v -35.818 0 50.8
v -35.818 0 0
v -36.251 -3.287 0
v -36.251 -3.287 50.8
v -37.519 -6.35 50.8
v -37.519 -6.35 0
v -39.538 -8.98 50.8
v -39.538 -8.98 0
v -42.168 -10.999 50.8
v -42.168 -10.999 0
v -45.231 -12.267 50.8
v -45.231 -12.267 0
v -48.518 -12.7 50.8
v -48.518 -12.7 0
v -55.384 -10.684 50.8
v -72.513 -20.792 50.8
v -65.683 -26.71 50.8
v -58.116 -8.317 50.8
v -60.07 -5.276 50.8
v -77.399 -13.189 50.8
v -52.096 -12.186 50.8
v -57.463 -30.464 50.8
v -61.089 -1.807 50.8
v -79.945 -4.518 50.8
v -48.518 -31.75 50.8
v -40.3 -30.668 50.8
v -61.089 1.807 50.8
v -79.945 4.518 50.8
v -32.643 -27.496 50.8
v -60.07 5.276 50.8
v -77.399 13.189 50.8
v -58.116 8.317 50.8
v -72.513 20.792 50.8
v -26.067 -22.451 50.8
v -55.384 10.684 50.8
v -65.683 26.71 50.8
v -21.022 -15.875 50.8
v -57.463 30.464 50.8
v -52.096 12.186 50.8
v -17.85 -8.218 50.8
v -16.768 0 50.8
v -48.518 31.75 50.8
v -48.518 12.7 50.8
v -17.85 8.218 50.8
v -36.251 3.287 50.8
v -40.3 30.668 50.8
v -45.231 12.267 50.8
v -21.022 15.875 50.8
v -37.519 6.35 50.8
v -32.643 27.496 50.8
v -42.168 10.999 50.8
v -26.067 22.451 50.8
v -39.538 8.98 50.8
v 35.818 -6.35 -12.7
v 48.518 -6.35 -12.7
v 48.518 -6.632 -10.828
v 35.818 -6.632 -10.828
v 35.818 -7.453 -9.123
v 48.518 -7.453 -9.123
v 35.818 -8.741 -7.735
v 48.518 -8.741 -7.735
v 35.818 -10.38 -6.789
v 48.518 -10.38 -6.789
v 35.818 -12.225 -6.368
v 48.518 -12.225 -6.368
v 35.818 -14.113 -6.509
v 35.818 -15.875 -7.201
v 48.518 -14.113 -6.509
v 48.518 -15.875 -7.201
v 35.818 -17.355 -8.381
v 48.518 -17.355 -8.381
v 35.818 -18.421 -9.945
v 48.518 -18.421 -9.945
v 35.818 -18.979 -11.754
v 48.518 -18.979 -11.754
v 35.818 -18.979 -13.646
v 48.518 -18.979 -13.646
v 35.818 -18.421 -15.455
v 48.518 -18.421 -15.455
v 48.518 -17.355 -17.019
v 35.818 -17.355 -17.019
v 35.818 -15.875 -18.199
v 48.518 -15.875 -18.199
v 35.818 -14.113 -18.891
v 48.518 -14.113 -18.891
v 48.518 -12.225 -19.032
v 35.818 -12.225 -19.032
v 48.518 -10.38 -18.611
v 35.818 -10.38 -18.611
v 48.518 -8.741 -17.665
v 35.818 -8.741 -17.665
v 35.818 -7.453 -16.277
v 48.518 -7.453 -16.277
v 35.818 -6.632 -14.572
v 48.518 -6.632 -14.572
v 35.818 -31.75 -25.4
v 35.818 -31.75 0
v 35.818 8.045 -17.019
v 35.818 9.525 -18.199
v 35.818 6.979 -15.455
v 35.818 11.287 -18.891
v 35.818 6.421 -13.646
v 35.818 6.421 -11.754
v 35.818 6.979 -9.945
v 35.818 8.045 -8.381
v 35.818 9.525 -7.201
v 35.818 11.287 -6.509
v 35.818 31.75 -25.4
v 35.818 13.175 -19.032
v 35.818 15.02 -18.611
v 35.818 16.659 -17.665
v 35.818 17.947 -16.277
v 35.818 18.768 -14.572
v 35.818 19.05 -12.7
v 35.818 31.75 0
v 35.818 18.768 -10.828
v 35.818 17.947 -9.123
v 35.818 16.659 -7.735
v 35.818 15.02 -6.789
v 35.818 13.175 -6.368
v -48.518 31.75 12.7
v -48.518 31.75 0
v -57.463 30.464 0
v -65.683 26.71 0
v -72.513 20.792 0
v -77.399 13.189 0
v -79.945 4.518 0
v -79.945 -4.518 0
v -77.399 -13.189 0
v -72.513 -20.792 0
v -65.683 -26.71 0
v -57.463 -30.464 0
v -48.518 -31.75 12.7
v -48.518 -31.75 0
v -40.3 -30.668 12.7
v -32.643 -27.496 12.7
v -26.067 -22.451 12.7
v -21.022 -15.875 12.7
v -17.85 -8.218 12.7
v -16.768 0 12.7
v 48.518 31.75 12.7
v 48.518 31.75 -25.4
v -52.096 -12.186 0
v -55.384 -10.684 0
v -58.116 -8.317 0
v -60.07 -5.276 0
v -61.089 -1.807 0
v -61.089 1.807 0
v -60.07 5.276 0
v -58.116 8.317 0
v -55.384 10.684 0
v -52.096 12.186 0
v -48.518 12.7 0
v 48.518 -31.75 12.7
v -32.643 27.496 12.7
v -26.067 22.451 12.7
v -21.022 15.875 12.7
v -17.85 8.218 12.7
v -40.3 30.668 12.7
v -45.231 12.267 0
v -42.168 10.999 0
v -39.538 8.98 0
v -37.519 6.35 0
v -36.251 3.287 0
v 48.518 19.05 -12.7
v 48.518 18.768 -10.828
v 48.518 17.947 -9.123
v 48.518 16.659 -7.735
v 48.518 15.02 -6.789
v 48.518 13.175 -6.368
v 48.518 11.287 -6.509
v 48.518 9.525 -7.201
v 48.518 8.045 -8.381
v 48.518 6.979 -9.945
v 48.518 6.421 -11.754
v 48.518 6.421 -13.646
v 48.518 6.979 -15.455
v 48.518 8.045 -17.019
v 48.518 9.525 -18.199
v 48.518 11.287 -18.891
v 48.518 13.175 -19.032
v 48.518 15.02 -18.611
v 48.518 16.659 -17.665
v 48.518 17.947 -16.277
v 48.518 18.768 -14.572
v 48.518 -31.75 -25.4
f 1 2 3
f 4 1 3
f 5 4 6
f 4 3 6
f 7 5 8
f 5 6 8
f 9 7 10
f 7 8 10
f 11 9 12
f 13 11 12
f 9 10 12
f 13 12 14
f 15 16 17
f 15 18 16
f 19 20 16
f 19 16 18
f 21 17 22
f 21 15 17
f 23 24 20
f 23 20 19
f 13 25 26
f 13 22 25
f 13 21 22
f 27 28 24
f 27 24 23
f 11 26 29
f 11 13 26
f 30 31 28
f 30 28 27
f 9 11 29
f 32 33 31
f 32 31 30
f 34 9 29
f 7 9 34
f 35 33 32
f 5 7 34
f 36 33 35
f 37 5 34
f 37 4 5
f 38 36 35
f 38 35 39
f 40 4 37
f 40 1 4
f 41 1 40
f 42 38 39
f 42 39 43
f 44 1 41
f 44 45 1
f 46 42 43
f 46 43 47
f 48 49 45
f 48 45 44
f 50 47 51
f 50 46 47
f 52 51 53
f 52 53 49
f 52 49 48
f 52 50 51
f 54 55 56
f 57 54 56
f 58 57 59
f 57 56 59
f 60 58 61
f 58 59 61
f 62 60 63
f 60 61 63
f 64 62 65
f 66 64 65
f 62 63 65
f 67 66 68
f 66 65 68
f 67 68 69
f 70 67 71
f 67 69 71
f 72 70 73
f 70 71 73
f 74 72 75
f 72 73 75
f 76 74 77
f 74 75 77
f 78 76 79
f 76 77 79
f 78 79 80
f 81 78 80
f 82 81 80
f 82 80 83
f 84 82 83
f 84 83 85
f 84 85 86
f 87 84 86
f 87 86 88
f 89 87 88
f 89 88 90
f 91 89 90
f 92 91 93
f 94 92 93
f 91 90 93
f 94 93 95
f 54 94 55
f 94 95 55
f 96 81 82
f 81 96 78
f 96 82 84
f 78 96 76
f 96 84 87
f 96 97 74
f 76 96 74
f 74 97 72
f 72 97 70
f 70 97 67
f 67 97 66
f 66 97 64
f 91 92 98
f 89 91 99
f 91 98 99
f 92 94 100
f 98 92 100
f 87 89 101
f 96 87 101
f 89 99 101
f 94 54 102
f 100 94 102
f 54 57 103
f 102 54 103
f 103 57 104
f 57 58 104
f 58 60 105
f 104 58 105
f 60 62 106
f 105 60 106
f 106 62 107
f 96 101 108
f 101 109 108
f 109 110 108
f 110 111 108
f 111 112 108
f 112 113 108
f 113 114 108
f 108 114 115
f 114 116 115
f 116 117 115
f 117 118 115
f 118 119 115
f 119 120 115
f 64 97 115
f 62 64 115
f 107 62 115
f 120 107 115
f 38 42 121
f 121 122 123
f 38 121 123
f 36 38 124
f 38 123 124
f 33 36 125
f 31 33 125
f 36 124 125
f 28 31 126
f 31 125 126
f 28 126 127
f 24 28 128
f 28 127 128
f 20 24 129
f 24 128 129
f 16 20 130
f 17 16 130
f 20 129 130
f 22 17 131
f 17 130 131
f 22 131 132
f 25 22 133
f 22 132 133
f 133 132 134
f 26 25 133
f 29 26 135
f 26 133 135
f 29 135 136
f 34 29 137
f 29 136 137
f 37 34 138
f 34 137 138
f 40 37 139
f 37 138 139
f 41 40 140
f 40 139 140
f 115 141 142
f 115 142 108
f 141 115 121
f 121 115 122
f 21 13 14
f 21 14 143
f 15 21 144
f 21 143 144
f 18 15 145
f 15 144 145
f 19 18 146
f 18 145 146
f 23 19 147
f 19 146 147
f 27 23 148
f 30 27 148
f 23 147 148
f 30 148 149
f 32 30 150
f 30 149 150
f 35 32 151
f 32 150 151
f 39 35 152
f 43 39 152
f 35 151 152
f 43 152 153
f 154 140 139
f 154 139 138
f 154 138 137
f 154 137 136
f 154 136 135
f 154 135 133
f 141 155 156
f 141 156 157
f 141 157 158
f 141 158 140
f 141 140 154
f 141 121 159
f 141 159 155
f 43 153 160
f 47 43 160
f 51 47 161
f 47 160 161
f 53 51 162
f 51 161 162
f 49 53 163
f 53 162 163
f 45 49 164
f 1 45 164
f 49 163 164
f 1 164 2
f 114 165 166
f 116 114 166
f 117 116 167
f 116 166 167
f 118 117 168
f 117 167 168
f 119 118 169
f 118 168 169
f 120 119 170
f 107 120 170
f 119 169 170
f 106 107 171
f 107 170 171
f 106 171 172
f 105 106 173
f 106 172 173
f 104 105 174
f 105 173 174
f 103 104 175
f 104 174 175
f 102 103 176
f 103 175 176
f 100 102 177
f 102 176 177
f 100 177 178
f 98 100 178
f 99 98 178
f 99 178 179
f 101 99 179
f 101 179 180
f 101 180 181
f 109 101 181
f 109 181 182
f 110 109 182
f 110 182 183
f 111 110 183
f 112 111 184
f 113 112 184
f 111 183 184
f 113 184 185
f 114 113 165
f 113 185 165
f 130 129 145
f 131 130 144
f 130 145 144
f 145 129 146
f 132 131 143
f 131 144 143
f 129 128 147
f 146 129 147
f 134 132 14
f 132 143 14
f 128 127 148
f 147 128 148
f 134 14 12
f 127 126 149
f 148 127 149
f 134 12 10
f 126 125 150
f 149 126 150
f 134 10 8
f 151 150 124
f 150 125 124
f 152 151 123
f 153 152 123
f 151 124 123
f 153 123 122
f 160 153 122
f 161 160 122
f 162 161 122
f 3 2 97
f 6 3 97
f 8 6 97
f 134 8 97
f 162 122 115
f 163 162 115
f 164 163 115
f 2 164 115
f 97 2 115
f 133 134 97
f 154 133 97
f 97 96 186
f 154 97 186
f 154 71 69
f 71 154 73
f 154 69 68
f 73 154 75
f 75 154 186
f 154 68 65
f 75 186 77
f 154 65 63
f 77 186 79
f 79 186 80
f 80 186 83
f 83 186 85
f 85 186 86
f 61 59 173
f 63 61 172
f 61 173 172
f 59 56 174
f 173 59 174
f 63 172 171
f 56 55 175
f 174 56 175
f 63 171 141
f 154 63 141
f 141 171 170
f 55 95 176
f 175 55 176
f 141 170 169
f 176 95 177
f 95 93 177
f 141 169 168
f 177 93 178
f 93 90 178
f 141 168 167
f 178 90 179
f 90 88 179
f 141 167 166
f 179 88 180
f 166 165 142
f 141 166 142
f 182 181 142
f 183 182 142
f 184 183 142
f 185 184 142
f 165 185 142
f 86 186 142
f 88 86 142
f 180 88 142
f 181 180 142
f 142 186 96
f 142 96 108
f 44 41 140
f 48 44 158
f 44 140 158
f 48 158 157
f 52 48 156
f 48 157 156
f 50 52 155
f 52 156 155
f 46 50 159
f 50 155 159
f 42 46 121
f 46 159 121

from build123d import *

# Parameters (mm, degrees)
F1_DEPTH = 12.7
F2_DEPTH = 50.8
F3_R     = 6.35
F4_DEPTH = 12.7


with BuildPart() as f1:
    # F0 (on Top) → F1 (new body)
    with BuildSketch(Plane.XY):
        with BuildLine():
            Line((-48.517924, -31.75), (48.517924, -31.75))
            Line((48.517924, -31.75), (48.517924, 31.75))
            Line((48.517924, 31.75), (-48.517924, 31.75))
            ThreePointArc((-48.517924, 31.75), (-26.067284, 22.45064), (-16.767924, 0))
            ThreePointArc((-16.767924, 0), (-26.067284, -22.45064), (-48.517924, -31.75))
        make_face()
        with BuildLine():
            ThreePointArc((-48.517924, 31.75), (-80.267924, 0), (-48.517924, -31.75))
            Line((-48.517924, -31.75), (-48.517924, -12.7))
            ThreePointArc((-48.517924, -12.7), (-61.217924, 0), (-48.517924, 12.7))
            Line((-48.517924, 12.7), (-48.517924, 31.75))
        make_face()
    extrude(amount=F1_DEPTH)

    # F0 (on Top) → F2 (join)
    with BuildSketch(Plane.XY):
        with BuildLine():
            Line((-48.517924, -12.7), (-48.517924, -31.75))
            ThreePointArc((-48.517924, -31.75), (-26.067284, -22.45064), (-16.767924, 0))
            ThreePointArc((-16.767924, 0), (-26.067284, 22.45064), (-48.517924, 31.75))
            Line((-48.517924, 31.75), (-48.517924, 12.7))
            ThreePointArc((-48.517924, 12.7), (-39.537668, 8.980256), (-35.817924, 0))
            ThreePointArc((-35.817924, 0), (-39.537668, -8.980256), (-48.517924, -12.7))
        make_face()
        with BuildLine():
            ThreePointArc((-48.517924, 31.75), (-80.267924, 0), (-48.517924, -31.75))
            Line((-48.517924, -31.75), (-48.517924, -12.7))
            ThreePointArc((-48.517924, -12.7), (-61.217924, 0), (-48.517924, 12.7))
            Line((-48.517924, 12.7), (-48.517924, 31.75))
        make_face()
    extrude(amount=F2_DEPTH)

    # F3 (on face) → F4 (join)
    with BuildSketch(Plane.YZ.offset(48.517924)):
        Polygon((31.75, 12.7), (-31.75, 12.7), (-31.75, -25.4), (0, -25.4), (31.75, -25.4), align=None)
        with Locations((-12.7, -12.7)):
            Circle(F3_R, mode=Mode.SUBTRACT)
        with Locations((12.7, -12.7)):
            Circle(F3_R, mode=Mode.SUBTRACT)
    extrude(amount=-F4_DEPTH)


solid = f1.part
